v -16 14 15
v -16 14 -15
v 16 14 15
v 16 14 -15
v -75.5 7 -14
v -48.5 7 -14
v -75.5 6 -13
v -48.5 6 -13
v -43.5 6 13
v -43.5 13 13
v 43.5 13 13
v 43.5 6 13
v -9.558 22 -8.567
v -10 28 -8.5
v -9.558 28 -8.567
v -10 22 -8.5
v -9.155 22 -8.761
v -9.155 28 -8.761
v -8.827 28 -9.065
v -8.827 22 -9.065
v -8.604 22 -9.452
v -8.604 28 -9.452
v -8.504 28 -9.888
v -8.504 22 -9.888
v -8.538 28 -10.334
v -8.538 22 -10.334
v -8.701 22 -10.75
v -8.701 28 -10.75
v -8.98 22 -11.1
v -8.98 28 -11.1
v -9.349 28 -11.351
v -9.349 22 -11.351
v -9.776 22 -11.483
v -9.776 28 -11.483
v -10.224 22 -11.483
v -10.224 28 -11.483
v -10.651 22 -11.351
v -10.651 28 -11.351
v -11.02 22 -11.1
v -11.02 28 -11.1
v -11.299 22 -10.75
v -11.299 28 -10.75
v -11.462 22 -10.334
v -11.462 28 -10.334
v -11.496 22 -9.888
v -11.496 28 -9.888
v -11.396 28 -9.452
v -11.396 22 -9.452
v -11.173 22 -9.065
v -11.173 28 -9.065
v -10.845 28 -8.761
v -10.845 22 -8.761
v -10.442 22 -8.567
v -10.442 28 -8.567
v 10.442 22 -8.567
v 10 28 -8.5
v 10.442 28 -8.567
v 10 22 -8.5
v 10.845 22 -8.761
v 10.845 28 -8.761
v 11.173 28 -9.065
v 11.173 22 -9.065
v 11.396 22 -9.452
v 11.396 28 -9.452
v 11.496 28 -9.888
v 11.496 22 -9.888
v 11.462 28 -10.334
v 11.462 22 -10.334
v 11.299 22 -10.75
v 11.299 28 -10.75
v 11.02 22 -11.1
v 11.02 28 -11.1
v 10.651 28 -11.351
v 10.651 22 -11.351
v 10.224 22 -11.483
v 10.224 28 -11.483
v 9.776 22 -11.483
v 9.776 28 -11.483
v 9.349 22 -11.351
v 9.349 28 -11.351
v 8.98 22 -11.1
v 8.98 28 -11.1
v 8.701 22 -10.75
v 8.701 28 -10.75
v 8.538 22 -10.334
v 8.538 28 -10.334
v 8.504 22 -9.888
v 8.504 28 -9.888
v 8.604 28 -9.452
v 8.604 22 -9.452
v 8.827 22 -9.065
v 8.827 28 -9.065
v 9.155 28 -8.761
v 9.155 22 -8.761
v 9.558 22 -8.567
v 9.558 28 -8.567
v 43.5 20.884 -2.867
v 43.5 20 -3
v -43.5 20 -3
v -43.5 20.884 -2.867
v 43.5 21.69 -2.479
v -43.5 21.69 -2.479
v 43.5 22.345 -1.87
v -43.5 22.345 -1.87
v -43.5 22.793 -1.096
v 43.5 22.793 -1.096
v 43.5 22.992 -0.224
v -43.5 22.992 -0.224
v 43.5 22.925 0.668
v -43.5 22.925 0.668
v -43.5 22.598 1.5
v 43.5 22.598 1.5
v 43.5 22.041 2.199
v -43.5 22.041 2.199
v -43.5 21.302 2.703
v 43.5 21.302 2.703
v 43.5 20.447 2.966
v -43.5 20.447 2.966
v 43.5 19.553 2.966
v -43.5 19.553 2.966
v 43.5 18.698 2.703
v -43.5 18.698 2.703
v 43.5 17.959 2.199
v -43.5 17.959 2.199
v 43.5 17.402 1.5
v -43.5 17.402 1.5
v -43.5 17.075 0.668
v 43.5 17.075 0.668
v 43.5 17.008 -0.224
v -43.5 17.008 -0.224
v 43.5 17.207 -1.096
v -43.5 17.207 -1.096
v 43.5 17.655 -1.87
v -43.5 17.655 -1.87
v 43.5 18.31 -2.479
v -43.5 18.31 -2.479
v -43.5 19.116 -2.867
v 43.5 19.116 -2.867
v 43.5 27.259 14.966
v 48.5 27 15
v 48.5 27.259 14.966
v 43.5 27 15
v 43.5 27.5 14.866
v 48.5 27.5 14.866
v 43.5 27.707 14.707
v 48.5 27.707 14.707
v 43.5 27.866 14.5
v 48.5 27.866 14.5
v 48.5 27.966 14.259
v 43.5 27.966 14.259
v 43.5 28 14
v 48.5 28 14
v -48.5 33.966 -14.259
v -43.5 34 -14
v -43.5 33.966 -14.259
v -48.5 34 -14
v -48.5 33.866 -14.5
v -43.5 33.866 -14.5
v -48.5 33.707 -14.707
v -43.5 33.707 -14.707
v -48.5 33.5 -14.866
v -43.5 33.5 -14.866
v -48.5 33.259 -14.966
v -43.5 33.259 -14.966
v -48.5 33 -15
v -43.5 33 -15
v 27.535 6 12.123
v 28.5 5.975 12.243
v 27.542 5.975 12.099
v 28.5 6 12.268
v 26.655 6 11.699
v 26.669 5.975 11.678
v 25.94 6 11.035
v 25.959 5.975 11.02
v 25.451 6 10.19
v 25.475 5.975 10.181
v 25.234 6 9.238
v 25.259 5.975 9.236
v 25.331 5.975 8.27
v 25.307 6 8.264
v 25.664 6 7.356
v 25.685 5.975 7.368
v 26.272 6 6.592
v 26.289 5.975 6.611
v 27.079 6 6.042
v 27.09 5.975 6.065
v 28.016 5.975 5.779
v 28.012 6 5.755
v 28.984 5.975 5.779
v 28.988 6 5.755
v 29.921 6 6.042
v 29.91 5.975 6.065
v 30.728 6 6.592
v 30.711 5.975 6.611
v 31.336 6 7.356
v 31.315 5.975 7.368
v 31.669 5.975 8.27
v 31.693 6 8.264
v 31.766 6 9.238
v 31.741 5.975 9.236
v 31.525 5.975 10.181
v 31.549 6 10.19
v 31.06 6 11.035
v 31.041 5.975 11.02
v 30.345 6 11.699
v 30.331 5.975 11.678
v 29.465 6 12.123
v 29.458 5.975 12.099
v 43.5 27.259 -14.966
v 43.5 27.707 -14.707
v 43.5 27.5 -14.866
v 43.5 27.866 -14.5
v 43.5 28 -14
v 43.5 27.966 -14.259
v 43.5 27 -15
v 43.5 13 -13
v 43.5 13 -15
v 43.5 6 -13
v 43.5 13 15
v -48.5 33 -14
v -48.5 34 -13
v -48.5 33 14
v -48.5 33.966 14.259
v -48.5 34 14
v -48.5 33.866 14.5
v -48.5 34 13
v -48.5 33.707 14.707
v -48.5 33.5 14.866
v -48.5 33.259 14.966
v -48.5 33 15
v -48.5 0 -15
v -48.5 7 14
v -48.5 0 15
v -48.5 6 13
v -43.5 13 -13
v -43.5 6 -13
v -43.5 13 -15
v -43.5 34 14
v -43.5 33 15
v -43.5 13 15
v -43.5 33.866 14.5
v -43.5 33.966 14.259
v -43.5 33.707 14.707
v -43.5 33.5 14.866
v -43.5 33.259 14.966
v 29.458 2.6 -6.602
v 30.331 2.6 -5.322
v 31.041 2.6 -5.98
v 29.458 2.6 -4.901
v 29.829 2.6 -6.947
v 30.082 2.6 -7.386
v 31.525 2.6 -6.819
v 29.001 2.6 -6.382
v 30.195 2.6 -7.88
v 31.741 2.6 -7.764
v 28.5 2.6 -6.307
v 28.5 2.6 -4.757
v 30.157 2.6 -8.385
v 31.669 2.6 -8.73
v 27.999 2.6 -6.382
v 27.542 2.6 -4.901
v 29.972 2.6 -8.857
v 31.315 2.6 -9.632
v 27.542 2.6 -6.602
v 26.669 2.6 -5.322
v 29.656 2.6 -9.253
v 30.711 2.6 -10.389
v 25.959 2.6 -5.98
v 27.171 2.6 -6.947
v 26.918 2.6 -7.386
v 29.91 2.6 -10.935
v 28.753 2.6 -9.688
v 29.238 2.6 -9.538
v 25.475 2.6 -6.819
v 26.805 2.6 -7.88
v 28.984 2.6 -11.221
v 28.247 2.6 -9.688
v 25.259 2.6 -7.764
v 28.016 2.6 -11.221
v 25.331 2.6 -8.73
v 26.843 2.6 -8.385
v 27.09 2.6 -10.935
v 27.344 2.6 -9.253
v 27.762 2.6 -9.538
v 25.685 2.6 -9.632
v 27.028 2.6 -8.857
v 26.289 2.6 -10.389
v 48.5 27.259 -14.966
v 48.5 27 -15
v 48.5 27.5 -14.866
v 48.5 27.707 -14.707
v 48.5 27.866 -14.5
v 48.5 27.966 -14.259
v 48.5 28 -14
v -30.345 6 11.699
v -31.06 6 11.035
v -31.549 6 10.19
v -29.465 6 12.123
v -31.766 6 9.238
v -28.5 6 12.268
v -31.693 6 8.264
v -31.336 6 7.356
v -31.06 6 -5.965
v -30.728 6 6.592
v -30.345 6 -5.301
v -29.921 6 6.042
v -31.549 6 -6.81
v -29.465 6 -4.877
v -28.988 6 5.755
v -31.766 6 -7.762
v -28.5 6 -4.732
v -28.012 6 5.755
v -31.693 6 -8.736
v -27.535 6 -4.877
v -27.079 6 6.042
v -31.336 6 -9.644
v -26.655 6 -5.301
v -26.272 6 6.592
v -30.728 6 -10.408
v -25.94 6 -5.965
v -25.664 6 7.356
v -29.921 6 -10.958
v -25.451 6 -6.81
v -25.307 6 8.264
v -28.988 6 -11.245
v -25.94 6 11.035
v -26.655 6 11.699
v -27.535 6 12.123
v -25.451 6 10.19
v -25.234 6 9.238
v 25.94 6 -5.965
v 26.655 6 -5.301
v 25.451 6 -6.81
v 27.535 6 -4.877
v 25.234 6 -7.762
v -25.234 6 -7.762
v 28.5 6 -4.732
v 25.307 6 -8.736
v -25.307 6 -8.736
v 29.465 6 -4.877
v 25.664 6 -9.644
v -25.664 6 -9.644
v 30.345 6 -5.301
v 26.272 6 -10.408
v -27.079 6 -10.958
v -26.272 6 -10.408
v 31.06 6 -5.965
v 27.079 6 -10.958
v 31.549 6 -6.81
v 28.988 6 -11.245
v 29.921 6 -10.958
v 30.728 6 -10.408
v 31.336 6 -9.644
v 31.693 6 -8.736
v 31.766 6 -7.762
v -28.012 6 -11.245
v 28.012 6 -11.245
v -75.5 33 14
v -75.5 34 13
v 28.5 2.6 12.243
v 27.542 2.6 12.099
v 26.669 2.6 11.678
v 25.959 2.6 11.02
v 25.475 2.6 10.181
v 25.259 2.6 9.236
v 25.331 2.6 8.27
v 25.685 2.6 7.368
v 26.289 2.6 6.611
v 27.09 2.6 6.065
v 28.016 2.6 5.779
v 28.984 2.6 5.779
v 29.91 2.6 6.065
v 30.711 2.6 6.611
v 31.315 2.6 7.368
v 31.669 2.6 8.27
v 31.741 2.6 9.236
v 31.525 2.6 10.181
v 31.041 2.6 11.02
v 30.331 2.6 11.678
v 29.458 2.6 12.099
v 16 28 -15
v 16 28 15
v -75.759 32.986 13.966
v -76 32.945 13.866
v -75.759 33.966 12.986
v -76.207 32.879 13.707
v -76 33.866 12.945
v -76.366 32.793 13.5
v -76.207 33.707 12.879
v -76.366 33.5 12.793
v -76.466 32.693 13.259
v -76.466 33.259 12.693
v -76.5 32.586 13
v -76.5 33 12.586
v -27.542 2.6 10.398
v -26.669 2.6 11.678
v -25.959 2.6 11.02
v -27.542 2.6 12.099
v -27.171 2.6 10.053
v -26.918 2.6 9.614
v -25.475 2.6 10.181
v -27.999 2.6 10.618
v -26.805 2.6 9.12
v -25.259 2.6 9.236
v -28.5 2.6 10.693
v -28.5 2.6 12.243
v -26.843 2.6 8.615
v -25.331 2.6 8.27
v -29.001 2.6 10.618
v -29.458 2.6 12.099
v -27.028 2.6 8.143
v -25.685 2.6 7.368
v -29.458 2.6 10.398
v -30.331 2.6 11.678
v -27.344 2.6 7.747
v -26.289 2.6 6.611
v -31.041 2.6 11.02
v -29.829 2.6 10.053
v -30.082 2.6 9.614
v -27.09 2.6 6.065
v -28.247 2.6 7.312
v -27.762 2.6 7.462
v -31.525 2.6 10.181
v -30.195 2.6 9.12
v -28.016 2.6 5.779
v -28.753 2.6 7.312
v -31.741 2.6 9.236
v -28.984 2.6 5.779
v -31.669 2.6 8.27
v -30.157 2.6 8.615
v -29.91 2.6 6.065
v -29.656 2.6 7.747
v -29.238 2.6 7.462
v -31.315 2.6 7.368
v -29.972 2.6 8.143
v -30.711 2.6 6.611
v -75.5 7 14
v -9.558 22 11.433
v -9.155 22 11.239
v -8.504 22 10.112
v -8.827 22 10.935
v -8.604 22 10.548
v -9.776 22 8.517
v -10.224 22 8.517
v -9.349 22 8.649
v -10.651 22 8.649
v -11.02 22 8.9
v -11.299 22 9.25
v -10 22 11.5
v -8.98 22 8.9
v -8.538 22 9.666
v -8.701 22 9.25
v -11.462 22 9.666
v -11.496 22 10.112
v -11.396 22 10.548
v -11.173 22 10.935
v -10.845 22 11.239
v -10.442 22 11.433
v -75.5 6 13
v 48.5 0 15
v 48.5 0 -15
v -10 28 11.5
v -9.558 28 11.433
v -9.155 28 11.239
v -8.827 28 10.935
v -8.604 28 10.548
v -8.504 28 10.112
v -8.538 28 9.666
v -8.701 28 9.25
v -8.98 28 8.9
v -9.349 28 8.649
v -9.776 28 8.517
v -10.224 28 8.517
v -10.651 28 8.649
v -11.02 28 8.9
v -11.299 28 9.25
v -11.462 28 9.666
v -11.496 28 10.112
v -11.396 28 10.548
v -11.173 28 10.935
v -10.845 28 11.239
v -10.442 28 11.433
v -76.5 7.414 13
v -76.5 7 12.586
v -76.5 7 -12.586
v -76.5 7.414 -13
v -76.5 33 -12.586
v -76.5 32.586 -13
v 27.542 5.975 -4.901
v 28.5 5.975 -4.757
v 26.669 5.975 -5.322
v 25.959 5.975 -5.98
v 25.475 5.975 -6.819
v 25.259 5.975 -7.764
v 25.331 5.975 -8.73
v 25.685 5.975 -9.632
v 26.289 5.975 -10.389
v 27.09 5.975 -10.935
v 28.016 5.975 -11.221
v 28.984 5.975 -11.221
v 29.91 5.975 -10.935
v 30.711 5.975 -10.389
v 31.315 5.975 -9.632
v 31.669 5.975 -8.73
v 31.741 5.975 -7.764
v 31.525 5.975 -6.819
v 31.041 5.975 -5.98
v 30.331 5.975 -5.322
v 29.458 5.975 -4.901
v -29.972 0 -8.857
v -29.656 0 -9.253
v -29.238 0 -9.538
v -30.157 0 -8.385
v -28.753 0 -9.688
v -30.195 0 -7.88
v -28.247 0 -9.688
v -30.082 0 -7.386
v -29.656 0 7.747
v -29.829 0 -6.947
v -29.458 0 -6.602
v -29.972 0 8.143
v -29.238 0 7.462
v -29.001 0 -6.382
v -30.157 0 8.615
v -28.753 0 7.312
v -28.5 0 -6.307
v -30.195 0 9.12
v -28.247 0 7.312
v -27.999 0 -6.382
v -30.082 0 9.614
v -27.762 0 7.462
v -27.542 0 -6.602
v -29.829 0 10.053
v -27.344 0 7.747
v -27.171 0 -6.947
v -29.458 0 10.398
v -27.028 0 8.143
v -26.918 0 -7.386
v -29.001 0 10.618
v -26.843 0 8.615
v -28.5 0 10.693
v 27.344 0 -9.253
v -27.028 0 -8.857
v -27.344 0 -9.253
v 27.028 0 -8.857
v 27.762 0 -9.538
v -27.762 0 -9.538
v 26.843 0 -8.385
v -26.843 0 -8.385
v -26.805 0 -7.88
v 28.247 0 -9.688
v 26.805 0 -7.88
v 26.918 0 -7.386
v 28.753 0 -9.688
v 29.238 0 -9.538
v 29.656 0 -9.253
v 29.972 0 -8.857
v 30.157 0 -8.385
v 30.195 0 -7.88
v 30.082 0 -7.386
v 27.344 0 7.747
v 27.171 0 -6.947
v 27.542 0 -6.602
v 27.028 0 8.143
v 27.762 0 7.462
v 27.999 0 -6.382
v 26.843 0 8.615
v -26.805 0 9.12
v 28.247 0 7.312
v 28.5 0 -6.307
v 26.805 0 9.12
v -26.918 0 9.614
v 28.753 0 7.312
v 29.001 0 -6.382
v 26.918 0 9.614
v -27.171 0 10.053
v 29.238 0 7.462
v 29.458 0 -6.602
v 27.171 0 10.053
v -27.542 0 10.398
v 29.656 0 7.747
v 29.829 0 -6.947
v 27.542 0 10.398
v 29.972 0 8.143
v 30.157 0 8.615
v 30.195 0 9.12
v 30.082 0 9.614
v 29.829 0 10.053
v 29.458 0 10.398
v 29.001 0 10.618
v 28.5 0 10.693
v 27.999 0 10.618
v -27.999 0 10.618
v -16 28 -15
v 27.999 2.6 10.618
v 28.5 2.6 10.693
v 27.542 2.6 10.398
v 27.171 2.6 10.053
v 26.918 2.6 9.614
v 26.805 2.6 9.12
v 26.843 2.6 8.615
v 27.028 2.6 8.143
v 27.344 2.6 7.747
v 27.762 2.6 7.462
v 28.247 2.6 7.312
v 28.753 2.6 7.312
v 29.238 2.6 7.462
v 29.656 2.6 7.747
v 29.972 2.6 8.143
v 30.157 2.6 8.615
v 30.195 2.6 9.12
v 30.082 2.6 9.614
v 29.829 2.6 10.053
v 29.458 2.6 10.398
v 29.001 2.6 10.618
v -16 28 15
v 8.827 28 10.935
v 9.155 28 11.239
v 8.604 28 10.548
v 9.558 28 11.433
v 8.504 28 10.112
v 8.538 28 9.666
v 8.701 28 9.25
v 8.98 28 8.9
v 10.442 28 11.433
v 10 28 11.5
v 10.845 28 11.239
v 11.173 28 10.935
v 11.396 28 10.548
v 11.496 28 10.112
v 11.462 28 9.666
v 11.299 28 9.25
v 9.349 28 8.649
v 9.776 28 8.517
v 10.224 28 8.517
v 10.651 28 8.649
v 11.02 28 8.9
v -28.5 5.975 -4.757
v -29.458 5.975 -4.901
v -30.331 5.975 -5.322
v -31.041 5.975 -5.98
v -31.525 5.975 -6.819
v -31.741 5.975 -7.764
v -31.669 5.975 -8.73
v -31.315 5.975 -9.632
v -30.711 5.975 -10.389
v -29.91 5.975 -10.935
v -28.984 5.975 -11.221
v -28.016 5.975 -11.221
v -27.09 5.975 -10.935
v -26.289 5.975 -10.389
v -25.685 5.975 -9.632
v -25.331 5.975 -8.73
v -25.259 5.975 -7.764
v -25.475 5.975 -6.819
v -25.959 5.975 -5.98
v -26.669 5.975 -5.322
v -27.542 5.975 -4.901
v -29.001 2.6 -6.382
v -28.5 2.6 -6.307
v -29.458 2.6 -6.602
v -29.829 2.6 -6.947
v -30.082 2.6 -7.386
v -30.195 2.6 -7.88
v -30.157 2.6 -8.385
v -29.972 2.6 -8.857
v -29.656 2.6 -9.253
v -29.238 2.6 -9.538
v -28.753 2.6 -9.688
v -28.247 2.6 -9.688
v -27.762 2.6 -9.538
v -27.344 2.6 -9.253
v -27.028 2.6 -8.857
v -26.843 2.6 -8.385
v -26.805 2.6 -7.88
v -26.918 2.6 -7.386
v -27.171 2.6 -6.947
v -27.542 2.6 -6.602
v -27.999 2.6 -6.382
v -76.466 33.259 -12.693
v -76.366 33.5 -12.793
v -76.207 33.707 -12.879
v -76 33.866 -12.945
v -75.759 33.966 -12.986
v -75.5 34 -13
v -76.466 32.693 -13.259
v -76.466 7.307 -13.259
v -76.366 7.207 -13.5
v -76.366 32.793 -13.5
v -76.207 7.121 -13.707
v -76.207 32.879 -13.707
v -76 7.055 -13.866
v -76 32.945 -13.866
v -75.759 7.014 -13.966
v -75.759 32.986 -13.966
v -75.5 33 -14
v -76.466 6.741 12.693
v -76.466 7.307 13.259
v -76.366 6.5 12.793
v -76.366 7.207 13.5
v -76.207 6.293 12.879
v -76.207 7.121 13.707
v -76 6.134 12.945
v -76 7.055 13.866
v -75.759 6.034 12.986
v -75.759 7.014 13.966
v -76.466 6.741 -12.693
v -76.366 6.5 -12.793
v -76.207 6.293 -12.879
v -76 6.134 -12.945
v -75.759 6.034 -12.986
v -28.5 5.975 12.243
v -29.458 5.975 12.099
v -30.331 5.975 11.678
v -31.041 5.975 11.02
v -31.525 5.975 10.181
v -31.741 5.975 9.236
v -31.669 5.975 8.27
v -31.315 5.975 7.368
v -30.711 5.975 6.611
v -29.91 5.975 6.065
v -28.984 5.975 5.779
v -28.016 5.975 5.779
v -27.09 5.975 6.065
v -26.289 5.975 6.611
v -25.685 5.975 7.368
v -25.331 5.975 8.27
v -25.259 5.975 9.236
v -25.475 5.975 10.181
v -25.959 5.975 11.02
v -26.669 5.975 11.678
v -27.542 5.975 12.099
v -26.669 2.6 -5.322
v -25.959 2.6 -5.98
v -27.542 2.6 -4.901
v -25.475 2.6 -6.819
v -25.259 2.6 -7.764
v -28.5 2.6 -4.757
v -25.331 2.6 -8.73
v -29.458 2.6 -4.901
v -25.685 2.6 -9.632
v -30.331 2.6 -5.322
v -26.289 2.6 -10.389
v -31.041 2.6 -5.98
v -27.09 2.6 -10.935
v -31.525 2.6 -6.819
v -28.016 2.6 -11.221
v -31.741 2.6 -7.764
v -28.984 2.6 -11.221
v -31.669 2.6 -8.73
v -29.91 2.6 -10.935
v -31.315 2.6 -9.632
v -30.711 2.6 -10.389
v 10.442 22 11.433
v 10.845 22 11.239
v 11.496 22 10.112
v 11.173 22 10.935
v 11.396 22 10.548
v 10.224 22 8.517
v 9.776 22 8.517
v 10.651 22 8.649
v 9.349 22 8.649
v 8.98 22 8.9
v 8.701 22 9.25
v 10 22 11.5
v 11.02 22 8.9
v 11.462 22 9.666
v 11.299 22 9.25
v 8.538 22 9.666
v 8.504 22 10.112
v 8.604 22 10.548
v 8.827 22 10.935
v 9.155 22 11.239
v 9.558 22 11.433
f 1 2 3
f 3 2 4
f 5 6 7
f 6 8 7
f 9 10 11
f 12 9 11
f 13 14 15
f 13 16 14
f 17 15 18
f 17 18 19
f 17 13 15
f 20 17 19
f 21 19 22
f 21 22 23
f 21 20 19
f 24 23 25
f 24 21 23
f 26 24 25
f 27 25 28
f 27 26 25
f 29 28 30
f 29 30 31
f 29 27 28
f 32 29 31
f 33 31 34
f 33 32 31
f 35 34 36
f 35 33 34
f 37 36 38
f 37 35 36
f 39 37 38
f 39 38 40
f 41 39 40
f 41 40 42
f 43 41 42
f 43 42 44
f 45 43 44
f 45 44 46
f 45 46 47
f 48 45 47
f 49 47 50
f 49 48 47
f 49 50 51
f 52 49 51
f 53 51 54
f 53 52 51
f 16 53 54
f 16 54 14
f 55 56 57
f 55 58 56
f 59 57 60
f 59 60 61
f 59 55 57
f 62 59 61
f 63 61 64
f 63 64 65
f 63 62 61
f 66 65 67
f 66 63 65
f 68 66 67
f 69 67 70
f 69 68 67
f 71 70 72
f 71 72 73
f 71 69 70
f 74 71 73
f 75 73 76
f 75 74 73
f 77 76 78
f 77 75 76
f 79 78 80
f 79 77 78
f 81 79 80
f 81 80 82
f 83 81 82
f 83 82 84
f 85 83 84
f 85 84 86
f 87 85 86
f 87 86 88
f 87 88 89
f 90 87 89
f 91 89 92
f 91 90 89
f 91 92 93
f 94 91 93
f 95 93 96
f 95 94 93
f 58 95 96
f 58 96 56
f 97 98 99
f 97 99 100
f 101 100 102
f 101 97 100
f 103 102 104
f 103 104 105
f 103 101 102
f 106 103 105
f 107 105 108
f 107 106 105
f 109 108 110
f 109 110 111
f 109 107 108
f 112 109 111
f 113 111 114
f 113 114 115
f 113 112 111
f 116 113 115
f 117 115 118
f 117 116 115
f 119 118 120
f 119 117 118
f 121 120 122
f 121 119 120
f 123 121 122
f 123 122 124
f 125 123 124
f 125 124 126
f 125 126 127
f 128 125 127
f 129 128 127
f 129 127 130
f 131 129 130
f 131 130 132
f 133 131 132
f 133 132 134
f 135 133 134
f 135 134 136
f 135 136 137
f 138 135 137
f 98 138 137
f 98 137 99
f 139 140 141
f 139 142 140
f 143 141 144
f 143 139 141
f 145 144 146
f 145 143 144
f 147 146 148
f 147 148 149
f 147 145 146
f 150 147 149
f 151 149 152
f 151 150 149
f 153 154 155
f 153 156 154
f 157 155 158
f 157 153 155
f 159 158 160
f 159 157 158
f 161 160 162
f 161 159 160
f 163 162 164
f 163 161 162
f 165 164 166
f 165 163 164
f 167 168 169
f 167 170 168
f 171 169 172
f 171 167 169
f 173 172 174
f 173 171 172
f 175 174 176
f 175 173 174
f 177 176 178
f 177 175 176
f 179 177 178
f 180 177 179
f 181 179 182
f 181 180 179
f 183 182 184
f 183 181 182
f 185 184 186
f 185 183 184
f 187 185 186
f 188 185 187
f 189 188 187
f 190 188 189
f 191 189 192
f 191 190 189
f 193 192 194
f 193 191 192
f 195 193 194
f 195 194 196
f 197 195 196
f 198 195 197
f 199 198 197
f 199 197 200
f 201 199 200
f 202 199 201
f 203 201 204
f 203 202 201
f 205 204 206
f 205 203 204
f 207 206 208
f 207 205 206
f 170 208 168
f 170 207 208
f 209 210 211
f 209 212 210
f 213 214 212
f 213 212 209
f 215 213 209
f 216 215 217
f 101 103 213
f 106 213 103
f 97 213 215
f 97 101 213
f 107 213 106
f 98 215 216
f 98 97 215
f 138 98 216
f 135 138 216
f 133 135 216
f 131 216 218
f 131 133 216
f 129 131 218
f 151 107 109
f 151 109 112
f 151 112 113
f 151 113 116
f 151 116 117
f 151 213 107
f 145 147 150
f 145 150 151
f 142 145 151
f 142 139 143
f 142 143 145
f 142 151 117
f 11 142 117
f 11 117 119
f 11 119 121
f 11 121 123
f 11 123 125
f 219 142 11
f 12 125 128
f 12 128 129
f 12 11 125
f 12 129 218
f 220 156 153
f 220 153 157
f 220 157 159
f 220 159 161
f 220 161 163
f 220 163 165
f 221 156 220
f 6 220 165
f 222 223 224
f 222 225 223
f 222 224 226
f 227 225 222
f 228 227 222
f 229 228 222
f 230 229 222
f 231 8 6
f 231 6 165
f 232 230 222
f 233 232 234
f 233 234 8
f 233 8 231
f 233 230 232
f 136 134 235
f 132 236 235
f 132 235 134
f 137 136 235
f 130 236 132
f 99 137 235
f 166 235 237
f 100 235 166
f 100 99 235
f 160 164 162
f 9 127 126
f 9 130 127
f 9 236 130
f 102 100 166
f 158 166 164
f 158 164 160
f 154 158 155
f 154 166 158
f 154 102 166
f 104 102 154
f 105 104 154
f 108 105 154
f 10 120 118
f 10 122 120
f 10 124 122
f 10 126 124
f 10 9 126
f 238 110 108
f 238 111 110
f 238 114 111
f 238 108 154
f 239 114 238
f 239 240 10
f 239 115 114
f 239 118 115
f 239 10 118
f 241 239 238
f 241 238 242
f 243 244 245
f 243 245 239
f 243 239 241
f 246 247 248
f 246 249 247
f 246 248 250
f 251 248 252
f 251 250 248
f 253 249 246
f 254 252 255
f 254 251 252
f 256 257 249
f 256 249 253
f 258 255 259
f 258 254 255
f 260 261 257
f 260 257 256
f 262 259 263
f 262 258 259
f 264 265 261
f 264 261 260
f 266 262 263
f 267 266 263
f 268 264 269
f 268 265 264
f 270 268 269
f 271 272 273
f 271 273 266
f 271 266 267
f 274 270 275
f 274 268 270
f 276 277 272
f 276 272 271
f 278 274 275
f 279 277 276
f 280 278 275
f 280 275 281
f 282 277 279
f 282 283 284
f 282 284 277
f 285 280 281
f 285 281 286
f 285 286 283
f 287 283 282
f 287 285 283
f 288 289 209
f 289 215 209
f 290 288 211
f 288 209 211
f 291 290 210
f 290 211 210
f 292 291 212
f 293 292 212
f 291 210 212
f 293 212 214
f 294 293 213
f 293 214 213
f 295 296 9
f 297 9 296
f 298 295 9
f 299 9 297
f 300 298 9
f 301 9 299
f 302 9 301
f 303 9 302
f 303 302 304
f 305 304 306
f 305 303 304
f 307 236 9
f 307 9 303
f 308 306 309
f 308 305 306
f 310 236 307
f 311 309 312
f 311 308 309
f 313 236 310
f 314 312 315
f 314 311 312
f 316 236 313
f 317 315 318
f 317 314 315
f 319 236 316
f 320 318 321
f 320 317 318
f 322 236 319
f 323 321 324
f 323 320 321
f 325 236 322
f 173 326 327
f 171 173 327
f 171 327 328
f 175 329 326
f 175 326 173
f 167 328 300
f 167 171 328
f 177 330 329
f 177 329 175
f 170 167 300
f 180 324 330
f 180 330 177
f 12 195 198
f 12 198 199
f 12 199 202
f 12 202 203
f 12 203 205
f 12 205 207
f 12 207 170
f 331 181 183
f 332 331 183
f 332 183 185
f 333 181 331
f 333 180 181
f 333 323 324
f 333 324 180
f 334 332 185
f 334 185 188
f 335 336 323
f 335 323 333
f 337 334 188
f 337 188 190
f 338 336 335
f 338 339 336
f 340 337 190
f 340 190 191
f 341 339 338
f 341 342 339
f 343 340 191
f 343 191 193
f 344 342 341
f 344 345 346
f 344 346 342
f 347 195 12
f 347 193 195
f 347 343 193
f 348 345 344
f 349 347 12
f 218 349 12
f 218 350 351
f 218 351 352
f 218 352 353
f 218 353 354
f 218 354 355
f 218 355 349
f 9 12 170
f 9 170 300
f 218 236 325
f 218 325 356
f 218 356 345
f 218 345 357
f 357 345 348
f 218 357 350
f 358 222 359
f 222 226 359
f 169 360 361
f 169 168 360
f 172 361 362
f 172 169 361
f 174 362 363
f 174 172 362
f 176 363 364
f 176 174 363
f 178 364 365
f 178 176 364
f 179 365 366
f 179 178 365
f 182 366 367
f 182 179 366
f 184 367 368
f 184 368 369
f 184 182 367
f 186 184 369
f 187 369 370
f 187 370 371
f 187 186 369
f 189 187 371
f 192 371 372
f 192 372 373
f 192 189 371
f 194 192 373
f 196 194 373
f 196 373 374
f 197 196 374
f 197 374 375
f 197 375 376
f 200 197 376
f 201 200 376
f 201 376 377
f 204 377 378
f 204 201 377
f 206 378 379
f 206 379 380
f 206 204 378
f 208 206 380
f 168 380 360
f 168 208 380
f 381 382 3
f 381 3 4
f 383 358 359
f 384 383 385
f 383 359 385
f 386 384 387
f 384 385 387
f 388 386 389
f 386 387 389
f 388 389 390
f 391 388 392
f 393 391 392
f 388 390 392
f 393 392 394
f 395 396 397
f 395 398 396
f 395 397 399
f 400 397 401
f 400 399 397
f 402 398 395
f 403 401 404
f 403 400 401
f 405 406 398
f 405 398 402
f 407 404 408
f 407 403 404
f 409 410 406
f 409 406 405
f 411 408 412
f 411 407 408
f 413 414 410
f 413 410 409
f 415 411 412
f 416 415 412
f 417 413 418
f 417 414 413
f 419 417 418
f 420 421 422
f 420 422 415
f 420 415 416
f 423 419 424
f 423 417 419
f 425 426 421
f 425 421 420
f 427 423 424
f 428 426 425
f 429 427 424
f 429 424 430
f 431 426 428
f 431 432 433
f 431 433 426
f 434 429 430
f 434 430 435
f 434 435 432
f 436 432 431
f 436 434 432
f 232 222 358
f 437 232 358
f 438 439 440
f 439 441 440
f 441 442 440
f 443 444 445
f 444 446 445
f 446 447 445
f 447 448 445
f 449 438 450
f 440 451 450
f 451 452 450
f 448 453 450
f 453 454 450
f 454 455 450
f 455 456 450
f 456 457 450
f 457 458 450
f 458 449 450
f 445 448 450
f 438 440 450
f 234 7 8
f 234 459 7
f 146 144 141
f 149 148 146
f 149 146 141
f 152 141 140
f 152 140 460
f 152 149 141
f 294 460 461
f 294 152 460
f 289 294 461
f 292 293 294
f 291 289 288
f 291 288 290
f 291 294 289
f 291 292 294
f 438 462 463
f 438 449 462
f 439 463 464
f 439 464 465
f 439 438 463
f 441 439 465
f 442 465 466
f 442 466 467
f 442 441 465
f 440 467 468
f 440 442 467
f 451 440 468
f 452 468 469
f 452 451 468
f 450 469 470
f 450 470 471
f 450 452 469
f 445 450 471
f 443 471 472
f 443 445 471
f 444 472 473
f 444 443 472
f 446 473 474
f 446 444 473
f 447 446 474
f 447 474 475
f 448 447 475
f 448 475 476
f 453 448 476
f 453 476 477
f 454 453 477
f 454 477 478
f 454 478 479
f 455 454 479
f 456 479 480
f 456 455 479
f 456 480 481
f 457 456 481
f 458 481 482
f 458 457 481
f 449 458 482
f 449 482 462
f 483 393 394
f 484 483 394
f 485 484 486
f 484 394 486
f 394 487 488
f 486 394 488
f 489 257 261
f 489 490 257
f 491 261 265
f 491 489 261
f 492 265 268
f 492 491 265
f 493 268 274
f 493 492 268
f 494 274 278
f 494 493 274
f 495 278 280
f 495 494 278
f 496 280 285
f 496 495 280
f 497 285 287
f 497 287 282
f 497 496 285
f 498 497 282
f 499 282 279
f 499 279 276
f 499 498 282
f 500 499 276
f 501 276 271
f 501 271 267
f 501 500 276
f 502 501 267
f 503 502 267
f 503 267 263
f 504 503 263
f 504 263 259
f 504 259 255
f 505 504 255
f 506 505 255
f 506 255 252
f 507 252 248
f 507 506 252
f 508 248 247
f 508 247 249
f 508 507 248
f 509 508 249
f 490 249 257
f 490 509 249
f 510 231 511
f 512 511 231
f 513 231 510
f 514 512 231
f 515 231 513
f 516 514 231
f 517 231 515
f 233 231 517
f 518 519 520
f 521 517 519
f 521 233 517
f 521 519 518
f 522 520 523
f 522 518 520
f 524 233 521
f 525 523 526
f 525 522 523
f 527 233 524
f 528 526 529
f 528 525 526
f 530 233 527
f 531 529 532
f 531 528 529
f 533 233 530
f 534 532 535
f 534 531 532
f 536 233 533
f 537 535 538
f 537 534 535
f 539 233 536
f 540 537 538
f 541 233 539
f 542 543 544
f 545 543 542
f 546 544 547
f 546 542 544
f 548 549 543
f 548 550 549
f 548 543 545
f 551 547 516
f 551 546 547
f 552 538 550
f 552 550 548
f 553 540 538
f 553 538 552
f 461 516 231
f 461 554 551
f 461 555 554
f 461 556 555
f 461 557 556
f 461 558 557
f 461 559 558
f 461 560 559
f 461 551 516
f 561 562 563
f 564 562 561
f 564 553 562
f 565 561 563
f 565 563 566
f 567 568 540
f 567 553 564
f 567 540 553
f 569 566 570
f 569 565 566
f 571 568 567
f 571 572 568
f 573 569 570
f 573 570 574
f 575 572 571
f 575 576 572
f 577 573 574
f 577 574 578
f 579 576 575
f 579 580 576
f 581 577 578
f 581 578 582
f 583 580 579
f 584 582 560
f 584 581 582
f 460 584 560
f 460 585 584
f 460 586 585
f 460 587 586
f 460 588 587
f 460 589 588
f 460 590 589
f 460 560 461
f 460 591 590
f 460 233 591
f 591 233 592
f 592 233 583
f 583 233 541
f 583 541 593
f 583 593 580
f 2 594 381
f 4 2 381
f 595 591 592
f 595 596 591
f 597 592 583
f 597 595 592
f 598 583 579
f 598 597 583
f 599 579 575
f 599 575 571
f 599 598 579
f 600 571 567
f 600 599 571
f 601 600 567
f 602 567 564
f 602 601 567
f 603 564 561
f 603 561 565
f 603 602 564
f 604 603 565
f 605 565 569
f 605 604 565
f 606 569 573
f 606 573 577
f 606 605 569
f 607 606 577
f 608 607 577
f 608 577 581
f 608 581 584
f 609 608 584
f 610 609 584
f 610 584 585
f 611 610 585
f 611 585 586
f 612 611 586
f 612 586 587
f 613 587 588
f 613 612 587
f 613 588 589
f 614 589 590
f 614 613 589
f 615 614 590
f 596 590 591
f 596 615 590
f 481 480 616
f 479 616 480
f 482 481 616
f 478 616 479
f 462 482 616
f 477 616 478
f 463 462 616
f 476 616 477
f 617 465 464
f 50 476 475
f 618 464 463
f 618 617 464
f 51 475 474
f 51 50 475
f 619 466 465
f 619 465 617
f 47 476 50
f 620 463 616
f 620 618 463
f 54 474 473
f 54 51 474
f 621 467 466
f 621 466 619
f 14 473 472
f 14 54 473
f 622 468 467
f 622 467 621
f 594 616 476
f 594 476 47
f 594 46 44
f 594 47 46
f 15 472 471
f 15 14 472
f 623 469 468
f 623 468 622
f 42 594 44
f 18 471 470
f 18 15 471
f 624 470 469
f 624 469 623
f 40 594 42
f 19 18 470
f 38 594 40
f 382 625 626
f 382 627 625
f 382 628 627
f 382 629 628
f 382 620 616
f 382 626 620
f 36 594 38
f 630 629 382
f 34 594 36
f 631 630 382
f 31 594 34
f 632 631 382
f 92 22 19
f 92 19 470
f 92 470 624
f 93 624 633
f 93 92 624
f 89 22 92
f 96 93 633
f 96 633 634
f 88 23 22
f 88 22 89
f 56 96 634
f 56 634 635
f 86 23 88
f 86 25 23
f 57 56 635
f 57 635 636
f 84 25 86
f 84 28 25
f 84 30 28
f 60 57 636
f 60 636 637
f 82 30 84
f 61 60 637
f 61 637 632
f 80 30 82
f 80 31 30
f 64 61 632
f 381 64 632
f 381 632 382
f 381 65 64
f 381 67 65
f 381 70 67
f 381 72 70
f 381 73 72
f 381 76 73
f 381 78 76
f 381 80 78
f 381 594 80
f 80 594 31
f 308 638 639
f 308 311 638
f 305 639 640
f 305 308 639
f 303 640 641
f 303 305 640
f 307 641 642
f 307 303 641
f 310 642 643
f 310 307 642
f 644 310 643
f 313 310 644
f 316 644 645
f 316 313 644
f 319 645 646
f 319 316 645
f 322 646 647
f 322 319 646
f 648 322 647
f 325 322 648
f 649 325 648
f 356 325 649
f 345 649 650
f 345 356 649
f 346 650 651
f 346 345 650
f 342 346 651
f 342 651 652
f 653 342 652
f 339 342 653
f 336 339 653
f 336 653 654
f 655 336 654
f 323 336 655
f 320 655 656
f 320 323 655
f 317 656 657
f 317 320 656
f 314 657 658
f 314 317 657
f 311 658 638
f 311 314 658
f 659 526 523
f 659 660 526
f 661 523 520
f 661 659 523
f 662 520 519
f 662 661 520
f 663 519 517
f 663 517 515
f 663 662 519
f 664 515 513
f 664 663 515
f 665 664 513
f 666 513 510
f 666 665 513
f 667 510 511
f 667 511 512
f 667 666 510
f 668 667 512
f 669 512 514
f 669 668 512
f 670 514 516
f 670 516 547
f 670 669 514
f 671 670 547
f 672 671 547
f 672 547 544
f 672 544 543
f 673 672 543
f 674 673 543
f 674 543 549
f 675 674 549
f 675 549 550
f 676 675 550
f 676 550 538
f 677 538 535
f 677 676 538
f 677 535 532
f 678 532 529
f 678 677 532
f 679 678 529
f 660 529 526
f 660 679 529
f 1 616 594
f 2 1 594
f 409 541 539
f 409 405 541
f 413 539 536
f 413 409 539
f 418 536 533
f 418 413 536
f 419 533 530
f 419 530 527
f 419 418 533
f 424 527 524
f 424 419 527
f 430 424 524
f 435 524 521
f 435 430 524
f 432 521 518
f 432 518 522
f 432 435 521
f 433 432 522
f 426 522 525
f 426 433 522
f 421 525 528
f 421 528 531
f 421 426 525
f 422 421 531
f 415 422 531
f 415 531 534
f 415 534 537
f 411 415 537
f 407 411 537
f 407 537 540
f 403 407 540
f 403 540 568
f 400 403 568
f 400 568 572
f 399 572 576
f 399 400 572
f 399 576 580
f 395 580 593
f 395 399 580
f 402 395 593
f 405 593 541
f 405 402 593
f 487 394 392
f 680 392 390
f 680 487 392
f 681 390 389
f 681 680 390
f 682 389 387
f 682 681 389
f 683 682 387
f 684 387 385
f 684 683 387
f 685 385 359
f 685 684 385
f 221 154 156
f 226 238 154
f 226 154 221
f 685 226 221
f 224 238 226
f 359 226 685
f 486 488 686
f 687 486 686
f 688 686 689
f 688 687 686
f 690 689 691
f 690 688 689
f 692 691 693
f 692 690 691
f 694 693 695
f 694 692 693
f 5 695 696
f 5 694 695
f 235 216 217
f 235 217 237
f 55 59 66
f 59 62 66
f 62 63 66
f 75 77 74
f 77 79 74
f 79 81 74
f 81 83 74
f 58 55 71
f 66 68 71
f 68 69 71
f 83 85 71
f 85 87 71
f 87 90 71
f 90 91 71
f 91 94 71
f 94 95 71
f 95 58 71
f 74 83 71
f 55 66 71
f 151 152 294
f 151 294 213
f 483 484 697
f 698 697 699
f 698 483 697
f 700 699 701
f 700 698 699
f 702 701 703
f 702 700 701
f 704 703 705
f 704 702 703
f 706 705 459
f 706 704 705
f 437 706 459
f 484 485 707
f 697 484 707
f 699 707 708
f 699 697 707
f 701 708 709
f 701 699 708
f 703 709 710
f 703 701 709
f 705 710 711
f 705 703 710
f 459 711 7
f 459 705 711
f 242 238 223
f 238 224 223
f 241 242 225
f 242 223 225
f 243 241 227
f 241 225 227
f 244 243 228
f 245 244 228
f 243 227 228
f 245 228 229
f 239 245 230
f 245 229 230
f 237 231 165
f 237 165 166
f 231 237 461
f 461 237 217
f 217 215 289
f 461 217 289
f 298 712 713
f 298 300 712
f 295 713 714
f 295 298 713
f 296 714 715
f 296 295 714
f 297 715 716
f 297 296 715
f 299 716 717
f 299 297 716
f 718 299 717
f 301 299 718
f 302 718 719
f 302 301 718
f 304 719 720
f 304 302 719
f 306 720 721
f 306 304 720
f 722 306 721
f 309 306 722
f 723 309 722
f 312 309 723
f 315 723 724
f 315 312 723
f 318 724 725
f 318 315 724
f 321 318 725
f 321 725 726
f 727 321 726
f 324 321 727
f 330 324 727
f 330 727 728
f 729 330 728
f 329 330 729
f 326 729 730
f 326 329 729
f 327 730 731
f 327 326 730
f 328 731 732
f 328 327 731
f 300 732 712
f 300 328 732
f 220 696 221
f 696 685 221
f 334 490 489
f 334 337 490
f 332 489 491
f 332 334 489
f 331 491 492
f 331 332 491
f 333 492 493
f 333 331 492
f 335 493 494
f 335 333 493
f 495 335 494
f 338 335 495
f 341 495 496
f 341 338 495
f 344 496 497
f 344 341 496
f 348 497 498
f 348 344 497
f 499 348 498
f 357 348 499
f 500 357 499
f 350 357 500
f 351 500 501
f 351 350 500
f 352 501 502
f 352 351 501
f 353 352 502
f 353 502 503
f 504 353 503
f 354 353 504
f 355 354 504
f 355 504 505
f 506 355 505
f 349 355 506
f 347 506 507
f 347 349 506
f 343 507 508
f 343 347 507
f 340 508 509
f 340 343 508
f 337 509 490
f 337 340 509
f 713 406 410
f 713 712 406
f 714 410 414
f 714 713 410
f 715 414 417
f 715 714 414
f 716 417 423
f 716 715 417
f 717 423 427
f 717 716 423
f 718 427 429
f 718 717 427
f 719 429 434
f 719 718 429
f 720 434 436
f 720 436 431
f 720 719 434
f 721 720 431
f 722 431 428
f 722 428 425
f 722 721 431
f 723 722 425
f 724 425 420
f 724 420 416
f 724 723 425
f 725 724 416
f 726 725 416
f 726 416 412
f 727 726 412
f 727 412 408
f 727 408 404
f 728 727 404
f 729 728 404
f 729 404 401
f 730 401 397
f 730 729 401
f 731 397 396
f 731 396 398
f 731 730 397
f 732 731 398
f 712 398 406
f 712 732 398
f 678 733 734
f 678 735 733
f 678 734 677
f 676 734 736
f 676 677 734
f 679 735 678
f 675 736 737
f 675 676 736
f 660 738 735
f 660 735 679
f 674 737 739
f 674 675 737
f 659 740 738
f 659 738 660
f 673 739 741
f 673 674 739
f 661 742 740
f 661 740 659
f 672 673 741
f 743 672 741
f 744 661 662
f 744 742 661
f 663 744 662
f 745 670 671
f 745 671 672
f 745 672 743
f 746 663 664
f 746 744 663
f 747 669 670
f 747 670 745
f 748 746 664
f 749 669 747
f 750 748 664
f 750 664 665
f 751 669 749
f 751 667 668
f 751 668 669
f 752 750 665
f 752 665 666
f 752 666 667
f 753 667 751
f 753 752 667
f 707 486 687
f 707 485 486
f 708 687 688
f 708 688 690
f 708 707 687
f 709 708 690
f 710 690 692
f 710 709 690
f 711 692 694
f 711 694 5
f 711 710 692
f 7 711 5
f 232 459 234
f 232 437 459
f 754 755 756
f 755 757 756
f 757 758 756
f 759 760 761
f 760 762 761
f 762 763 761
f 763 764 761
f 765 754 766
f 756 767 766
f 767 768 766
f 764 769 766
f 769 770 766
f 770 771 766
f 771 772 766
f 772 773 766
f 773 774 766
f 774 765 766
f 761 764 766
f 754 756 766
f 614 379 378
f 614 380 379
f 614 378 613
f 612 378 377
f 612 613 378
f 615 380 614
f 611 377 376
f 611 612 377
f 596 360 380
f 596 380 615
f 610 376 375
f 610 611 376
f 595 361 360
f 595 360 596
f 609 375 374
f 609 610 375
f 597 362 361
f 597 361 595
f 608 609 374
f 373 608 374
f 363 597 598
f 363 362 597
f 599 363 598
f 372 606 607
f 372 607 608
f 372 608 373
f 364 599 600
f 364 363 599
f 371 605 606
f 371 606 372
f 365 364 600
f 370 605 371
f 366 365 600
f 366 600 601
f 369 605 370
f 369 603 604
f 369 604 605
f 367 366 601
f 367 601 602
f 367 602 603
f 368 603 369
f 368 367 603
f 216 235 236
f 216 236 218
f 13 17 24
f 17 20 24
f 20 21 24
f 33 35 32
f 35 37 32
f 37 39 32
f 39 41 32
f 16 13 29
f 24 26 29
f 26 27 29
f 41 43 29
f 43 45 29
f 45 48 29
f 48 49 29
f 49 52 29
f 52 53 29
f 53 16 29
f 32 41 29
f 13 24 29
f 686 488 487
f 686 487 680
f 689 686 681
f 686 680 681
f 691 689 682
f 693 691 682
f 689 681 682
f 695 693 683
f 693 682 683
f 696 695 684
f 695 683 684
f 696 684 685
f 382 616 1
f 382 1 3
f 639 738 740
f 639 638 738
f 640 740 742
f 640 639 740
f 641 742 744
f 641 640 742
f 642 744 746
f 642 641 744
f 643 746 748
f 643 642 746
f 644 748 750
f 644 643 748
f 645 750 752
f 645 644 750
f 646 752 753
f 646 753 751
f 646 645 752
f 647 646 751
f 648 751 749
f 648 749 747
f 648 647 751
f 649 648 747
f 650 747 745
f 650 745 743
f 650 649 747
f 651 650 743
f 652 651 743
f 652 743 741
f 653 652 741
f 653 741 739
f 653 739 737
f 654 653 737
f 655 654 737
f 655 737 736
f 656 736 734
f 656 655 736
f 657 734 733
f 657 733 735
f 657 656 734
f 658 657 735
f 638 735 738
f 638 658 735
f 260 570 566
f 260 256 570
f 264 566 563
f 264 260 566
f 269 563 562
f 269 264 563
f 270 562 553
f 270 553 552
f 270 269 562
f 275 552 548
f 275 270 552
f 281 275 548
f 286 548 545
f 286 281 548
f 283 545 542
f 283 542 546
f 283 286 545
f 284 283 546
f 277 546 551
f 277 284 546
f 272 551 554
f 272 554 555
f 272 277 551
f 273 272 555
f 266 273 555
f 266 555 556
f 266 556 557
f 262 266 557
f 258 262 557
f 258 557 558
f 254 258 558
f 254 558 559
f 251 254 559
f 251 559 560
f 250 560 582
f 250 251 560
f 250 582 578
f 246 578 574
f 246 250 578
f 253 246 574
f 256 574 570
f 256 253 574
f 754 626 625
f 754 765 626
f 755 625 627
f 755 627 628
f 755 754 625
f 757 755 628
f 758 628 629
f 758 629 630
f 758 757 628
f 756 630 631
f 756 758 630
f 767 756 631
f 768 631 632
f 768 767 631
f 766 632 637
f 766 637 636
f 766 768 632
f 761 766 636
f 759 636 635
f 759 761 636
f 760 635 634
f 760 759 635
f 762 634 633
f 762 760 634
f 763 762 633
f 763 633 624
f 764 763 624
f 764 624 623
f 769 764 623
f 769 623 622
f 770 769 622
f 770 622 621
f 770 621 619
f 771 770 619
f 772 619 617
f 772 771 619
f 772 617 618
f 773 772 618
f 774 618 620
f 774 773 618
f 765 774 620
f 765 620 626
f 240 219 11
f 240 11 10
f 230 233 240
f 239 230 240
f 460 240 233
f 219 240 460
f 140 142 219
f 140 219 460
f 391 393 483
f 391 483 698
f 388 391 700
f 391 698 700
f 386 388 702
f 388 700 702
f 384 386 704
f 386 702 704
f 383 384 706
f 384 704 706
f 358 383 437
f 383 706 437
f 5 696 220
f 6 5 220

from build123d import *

# Parameters (mm, degrees)
BOSS_EXTRUDE1_DEPTH                          = 15
SKETCH2_W                                    = 87
SKETCH2_H                                    = 26
CUT_EXTRUDE1_DEPTH                           = 7
SKETCH3_R                                    = 3
BOSS_EXTRUDE2_DEPTH                          = 92
CUT_EXTRUDE2_DEPTH                           = 35
CHAMFER1_SIZE                                = 1
FILLET1_R                                    = 1
FILLET2_R                                    = 1
CBORE_FOR_M3_HEX_SOCKET_HEAD_CAP_SCR_2_COUNT = 2
CBORE_FOR_M3_HEX_SOCKET_HEAD_CAP_SCR_2_PITCH = 17
CBORE_FOR_M3_HEX_SOCKET_HEAD_CAP_SCR_3_COUNT = 2
CBORE_FOR_M3_HEX_SOCKET_HEAD_CAP_SCR_3_PITCH = 57
CBORE_FOR_M3_HEX_SOCKET_HEAD_CAP_SCR_4_COUNT = 2
CBORE_FOR_M3_HEX_SOCKET_HEAD_CAP_SCR_4_PITCH = 59.481089432
SKETCH7_W                                    = 32
SKETCH7_H                                    = 30
BOSS_EXTRUDE3_DEPTH                          = 14
SKETCH10_W                                   = 1.5
SKETCH10_H                                   = 6
HOLE1_AT_2_COUNT                             = 2
HOLE1_AT_2_PITCH                             = 20
HOLE1_AT_3_COUNT                             = 2
HOLE1_AT_3_PITCH                             = 28.284271247
HOLE1_AT_4_COUNT                             = 2
HOLE1_AT_4_PITCH                             = 20


with BuildPart() as part:
    # Sketch1 → Boss-Extrude1 (new body, symmetric)
    with BuildSketch(Plane.XY):
        Polygon((-78.5, 34), (-78.5, 6), (-48.5, 6), (-48.5, 0), (48.5, 0), (48.5, 28), (43.5, 28), (43.5, 13), (-43.5, 13), (-43.5, 34), align=None)
    extrude(amount=BOSS_EXTRUDE1_DEPTH, both=True)

    # Sketch2 → Cut-Extrude1 (cut)
    with BuildSketch(Plane(origin=(0, 13, 0), x_dir=(1, 0, 0), z_dir=(0, 1, 0))):
        Rectangle(SKETCH2_W, SKETCH2_H)
    extrude(amount=-CUT_EXTRUDE1_DEPTH, mode=Mode.SUBTRACT)

    # Sketch3 → Boss-Extrude2 (add)
    with BuildSketch(Plane(origin=(48.5, 0, 0), x_dir=(0, 0, -1), z_dir=(1, 0, 0))):
        with Locations((0, 20)):
            Circle(SKETCH3_R)
    extrude(amount=-BOSS_EXTRUDE2_DEPTH)

    # Sketch4 → Cut-Extrude2 (cut, through all)
    with BuildSketch(Plane(origin=(0, 34, 0), x_dir=(1, 0, 0), z_dir=(0, 1, 0))):
        Polygon((-48.5, -15), (-48.5, -14), (-76.5, -14), (-76.5, 14), (-48.5, 14), (-48.5, 15), (-78.5, 15), (-78.5, -15), align=None)
    extrude(amount=-CUT_EXTRUDE2_DEPTH, mode=Mode.SUBTRACT)

    # Chamfer1
    chamfer1_edges = [part.edges().sort_by_distance(p)[0] for p in [
        (-62.5, 6, -14),
        (-62.5, 6, 14),
        (-62.5, 34, 14),
        (-62.5, 34, -14),
    ]]
    chamfer(chamfer1_edges, length=CHAMFER1_SIZE)

    # Fillet1
    fillet1_edges = [part.edges().sort_by_distance(p)[0] for p in [
        (-76.5, 34, 0),
        (-76.5, 20, -14),
        (-76.5, 33.5, 13.5),
        (-76.5, 33.5, -13.5),
        (-76.5, 6.5, -13.5),
        (-76.5, 6.5, 13.5),
        (-76.5, 6, 0),
        (-76.5, 20, 14),
    ]]
    fillet(fillet1_edges, radius=FILLET1_R)

    # Fillet2
    fillet2_edges = [part.edges().sort_by_distance(p)[0] for p in [
        (-46, 34, -15),
        (46, 28, -15),
        (46, 28, 15),
        (-46, 34, 15),
    ]]
    fillet(fillet2_edges, radius=FILLET2_R)

    # Sketch6 → CBORE for M3 Hex Socket Head Cap Screw1 (revolve, cut)
    with BuildSketch(Plane(origin=(-28.5, 6, -8.006829487), x_dir=(0, 0, 1), z_dir=(1, 0, 0))):
        Polygon((0, 0), (0, 6), (1.7, 6), (1.7, 3.4), (3.25, 3.4), (3.25, 0.025), (3.275, 0), align=None)
    cbore_for_m3_hex_socket_head_cap_screw1 = revolve(axis=Axis((-28.5, 12.35, -8.006829487), (0, -1, 0)), mode=Mode.SUBTRACT)

    # CBORE for M3 Hex Socket Head Cap Scr 2: CBORE for M3 Hex Socket Head Cap Screw1 ×2
    with Locations(*[(0, 0, i * CBORE_FOR_M3_HEX_SOCKET_HEAD_CAP_SCR_2_PITCH) for i in range(1, CBORE_FOR_M3_HEX_SOCKET_HEAD_CAP_SCR_2_COUNT)]):
        add(cbore_for_m3_hex_socket_head_cap_screw1, mode=Mode.SUBTRACT)

    # CBORE for M3 Hex Socket Head Cap Scr 3: CBORE for M3 Hex Socket Head Cap Screw1 ×2
    with Locations(*[(i * CBORE_FOR_M3_HEX_SOCKET_HEAD_CAP_SCR_3_PITCH, 0, 0) for i in range(1, CBORE_FOR_M3_HEX_SOCKET_HEAD_CAP_SCR_3_COUNT)]):
        add(cbore_for_m3_hex_socket_head_cap_screw1, mode=Mode.SUBTRACT)

    # CBORE for M3 Hex Socket Head Cap Scr 4: CBORE for M3 Hex Socket Head Cap Screw1 ×2
    with Locations(*[Vector(0.958287761, 0, 0.285805122) * (i * CBORE_FOR_M3_HEX_SOCKET_HEAD_CAP_SCR_4_PITCH) for i in range(1, CBORE_FOR_M3_HEX_SOCKET_HEAD_CAP_SCR_4_COUNT)]):
        add(cbore_for_m3_hex_socket_head_cap_screw1, mode=Mode.SUBTRACT)


with BuildPart() as body_2:
    # Sketch7 → Boss-Extrude3 (new body)
    with BuildSketch(Plane(origin=(0, 28, 0), x_dir=(1, 0, 0), z_dir=(0, 1, 0))):
        Rectangle(SKETCH7_W, SKETCH7_H)
    extrude(amount=-BOSS_EXTRUDE3_DEPTH)

    # Sketch10 → Hole1 (revolve, cut)
    with BuildSketch(Plane(origin=(10, 28, -10), x_dir=(0, 0, 1), z_dir=(1, 0, 0))):
        with Locations((0.75, 3)):
            Rectangle(SKETCH10_W, SKETCH10_H)
    hole1 = revolve(axis=Axis((10, -82, -10), (0, 1, 0)), mode=Mode.SUBTRACT)

    # Hole1 at 2: Hole1 ×2
    with Locations(*[(0, 0, i * HOLE1_AT_2_PITCH) for i in range(1, HOLE1_AT_2_COUNT)]):
        add(hole1, mode=Mode.SUBTRACT)

    # Hole1 at 3: Hole1 ×2
    with Locations(*[Vector(-0.707106781, 0, 0.707106781) * (i * HOLE1_AT_3_PITCH) for i in range(1, HOLE1_AT_3_COUNT)]):
        add(hole1, mode=Mode.SUBTRACT)

    # Hole1 at 4: Hole1 ×2
    with Locations(*[(-i * HOLE1_AT_4_PITCH, 0, 0) for i in range(1, HOLE1_AT_4_COUNT)]):
        add(hole1, mode=Mode.SUBTRACT)


solid = Compound([part.part, body_2.part])
